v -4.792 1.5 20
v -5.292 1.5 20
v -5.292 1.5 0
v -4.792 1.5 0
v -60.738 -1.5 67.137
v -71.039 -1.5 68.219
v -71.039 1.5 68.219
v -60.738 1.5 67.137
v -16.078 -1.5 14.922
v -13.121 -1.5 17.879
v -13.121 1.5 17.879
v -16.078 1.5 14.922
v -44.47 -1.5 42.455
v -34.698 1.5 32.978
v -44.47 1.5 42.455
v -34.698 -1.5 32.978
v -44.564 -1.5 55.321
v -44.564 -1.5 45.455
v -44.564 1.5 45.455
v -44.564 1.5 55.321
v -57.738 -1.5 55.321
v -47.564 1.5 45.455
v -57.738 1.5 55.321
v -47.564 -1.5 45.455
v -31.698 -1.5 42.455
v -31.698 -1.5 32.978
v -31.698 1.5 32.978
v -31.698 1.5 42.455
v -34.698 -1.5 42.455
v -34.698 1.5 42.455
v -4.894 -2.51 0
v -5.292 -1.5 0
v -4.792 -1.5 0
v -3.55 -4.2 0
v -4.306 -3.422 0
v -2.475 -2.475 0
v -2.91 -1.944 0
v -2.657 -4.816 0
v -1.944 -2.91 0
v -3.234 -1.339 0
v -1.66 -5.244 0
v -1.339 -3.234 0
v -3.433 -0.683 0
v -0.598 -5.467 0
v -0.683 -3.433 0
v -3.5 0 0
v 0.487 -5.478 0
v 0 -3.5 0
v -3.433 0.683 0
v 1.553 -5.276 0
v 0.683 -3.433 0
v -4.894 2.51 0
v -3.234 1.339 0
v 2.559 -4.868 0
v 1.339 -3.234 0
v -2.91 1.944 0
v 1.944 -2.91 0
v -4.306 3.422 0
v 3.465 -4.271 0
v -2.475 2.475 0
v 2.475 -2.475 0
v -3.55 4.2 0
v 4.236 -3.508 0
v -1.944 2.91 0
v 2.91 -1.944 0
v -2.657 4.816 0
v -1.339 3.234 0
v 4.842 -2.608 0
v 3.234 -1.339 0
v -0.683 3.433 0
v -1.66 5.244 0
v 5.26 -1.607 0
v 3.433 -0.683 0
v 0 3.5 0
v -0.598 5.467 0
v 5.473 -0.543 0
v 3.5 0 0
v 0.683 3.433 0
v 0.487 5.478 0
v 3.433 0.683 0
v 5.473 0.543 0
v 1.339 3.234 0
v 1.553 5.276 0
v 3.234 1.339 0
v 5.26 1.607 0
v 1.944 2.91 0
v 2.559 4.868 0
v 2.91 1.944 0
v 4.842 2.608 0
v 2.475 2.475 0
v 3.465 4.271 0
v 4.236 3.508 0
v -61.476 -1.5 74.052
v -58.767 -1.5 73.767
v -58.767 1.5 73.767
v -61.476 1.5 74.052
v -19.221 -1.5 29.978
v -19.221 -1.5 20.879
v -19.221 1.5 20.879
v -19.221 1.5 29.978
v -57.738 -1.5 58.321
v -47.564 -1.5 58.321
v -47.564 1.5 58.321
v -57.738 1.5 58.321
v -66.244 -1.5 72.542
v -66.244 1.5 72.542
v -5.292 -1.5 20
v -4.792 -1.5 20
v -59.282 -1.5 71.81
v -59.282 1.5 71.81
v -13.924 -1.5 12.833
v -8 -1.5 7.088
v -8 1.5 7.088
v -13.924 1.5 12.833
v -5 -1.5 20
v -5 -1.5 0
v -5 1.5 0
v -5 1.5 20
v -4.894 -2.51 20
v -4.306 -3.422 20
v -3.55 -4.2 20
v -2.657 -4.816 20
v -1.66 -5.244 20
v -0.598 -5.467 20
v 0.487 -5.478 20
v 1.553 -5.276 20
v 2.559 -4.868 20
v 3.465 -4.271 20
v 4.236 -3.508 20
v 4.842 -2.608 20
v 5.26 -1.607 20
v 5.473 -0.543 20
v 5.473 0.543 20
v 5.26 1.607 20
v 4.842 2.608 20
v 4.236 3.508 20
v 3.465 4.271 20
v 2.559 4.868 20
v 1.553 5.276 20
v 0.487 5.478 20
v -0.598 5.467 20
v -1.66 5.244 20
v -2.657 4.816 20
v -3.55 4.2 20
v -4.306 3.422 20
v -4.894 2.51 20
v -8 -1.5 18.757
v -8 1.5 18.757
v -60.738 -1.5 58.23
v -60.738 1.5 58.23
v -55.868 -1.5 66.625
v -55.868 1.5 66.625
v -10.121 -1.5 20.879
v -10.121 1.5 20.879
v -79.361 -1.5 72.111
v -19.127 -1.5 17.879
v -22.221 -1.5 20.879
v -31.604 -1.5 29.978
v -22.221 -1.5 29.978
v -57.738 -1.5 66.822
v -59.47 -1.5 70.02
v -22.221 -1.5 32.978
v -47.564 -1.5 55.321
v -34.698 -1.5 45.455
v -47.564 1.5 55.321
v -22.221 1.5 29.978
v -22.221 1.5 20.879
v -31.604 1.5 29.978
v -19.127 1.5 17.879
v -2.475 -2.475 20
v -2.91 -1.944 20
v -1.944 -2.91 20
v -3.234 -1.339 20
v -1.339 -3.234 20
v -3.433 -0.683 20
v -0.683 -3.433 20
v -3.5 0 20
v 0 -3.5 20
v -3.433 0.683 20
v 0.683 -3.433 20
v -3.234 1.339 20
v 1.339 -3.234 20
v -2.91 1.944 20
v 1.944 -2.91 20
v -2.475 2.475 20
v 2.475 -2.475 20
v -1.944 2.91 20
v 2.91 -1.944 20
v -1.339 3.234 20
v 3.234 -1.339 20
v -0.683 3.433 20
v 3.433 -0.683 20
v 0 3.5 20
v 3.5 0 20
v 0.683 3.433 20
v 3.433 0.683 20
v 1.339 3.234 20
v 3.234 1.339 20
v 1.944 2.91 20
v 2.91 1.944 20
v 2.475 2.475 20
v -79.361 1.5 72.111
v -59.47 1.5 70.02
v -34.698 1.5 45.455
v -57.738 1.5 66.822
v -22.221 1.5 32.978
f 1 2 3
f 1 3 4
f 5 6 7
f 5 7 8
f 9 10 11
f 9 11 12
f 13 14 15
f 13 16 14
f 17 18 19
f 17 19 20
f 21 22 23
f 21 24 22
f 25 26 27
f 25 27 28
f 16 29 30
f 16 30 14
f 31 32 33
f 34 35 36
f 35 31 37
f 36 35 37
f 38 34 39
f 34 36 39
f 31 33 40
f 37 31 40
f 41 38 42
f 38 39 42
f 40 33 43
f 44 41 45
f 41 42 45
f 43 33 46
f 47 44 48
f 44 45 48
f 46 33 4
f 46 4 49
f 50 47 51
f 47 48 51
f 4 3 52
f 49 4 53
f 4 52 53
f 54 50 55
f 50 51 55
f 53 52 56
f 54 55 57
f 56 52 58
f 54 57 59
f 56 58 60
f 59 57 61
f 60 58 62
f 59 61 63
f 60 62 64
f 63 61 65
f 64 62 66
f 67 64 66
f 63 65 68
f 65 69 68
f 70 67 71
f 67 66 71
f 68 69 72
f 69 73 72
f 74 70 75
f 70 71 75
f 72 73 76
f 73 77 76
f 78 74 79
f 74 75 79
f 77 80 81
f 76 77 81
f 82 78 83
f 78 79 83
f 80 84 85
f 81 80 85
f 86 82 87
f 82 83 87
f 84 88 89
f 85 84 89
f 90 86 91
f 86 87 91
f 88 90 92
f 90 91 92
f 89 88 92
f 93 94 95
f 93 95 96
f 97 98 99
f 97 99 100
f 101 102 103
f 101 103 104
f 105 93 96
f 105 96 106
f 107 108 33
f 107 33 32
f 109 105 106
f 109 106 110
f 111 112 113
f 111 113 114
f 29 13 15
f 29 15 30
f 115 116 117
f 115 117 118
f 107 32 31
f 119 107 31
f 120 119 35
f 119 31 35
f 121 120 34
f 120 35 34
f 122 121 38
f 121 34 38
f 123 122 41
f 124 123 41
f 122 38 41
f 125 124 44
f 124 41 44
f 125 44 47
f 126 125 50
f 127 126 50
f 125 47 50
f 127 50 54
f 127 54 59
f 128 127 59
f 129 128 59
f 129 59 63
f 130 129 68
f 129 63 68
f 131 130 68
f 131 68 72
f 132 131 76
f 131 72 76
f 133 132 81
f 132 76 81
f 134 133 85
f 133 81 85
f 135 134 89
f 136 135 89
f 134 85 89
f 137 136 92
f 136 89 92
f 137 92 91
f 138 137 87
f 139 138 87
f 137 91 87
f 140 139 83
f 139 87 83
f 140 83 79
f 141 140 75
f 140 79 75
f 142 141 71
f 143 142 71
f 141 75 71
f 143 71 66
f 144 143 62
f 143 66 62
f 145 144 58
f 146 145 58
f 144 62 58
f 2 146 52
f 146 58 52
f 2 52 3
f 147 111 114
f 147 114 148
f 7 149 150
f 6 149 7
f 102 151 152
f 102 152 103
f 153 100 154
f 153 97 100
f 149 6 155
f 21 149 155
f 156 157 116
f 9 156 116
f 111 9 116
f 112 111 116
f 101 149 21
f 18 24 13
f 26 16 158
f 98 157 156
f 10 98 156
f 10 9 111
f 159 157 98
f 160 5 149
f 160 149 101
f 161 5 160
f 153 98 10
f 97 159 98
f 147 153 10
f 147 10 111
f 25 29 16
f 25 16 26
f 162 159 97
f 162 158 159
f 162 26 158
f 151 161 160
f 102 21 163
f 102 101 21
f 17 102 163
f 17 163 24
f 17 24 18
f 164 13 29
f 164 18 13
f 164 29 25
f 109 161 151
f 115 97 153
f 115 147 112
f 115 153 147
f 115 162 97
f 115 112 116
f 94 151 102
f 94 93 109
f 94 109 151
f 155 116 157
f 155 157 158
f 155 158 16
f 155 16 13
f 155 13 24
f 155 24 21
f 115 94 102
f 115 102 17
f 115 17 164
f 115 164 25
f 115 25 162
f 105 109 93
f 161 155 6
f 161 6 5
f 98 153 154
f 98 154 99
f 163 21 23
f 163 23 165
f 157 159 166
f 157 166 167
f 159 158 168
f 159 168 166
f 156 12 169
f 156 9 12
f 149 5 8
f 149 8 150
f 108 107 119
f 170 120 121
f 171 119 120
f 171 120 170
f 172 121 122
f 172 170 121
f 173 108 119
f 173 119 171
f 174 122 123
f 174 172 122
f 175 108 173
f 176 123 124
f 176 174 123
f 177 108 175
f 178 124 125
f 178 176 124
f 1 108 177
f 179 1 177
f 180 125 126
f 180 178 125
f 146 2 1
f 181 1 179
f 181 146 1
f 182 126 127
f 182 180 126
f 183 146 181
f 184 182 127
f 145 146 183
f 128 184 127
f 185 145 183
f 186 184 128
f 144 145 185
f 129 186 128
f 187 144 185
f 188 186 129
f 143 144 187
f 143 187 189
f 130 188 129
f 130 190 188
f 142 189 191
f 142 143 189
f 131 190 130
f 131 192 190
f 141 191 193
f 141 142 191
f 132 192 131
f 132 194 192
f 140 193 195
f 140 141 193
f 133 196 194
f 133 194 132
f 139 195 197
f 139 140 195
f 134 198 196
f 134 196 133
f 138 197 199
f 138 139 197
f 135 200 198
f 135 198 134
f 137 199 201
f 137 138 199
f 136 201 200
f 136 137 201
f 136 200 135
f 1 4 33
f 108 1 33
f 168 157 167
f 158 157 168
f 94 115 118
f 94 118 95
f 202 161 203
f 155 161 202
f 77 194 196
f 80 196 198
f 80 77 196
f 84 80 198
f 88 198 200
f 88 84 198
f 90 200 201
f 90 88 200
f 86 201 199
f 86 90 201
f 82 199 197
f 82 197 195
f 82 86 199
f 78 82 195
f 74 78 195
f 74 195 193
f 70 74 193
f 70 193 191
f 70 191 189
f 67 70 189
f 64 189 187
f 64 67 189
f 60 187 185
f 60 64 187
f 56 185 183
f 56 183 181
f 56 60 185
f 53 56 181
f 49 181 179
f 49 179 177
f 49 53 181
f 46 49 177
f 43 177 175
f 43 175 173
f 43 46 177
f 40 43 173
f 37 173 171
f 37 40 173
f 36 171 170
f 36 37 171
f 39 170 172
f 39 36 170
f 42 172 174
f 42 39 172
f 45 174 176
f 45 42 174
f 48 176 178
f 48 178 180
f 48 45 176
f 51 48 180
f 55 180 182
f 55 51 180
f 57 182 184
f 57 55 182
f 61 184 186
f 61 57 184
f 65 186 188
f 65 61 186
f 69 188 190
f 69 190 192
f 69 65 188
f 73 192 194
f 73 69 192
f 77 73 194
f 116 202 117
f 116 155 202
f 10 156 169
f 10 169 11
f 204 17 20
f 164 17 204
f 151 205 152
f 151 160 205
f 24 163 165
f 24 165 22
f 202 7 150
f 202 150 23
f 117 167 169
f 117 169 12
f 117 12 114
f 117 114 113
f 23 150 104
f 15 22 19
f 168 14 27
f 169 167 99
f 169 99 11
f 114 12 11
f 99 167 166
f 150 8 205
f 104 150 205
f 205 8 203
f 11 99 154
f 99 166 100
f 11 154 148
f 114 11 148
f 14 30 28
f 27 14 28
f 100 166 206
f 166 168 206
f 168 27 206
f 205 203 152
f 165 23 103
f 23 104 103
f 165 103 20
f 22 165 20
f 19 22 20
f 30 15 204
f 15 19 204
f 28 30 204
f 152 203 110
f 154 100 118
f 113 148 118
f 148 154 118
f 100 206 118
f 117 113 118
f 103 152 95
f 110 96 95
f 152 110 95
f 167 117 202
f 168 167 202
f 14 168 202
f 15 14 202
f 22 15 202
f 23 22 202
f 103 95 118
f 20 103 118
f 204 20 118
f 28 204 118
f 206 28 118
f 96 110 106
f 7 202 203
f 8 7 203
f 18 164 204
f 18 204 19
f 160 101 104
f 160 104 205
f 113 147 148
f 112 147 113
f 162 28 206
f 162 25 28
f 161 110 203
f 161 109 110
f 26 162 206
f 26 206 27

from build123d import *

# Parameters (mm, degrees)
F0_R     = 3.5
F1_DEPTH = 20
F3_DEPTH = 1.5


# Not quite as in the source:
# - a feature names something its author has since deleted; it is built from what else it names


with BuildPart() as f1:
    # F0 (on Top) → F1 (new body)
    with BuildSketch(Plane.XY):
        with BuildLine():
            Line((-4.7915026221, -1.5), (-5.2915026221, -1.5))
            ThreePointArc((-5.2915026221, -1.5), (5.5, 0), (-5.2915026221, 1.5))
            Line((-5.2915026221, 1.5), (-4.7915026221, 1.5))
            Line((-4.7915026221, 1.5), (-4.7915026221, -1.5))
        make_face()
        Circle(F0_R, mode=Mode.SUBTRACT)
    extrude(amount=F1_DEPTH)


with BuildPart() as f3:
    # F2 (on Front) → F3 (new body, symmetric)
    with BuildSketch(Plane.XZ):
        Polygon((-79.3605220673, 72.1106862647), (-5, 0), (-5, 20), (-54.4974746831, 69.4974746831), (-59.4700841599, 70.0201169994), align=None)
        Polygon((-57.7379381947, 66.8215362837), (-55.8675960947, 66.6249554076), (-47.5639026581, 58.321261971), (-44.5639026581, 55.321261971), (-34.6976905307, 45.4550498436), (-31.6976905307, 42.4550498436), (-22.2207557225, 32.9781150354), (-19.2207557225, 29.9781150354), (-10.1213203436, 20.8786796564), (-8, 18.7573593129), (-8, 7.0881840299), (-13.9242084231, 12.8331508898), (-16.0781127981, 14.9218872019), (-19.1271564551, 17.8786796564), (-22.2207557225, 20.8786796564), (-31.6040912633, 29.9781150354), (-34.6976905307, 32.9781150354), (-44.4703033907, 42.4550498436), (-47.5639026581, 45.4550498436), (-57.7379381947, 55.321261971), (-60.7379381947, 58.2304946227), (-71.0385888152, 68.2194909957), (-60.7379381947, 67.1368489895), align=None, mode=Mode.SUBTRACT)
        Polygon((-44.5639026581, 55.321261971), (-47.5639026581, 58.321261971), (-57.7379381947, 58.321261971), (-57.7379381947, 66.8215362837), (-60.7379381947, 67.1368489895), (-60.7379381947, 58.2304946227), (-57.7379381947, 55.321261971), (-47.5639026581, 55.321261971), (-47.5639026581, 45.4550498436), (-44.4703033907, 42.4550498436), (-34.6976905307, 42.4550498436), (-34.6976905307, 32.9781150354), (-31.6040912633, 29.9781150354), (-22.2207557225, 29.9781150354), (-22.2207557225, 20.8786796564), (-19.1271564551, 17.8786796564), (-13.1213203436, 17.8786796564), (-16.0781127981, 14.9218872019), (-13.9242084231, 12.8331508898), (-8, 18.7573593129), (-10.1213203436, 20.8786796564), (-19.2207557225, 20.8786796564), (-19.2207557225, 29.9781150354), (-22.2207557225, 32.9781150354), (-31.6976905307, 32.9781150354), (-31.6976905307, 42.4550498436), (-34.6976905307, 45.4550498436), (-44.5639026581, 45.4550498436), align=None)
        Polygon((-59.281932926, 71.8102564111), (-59.4700841599, 70.0201169994), (-54.4974746831, 69.4974746831), (-58.7671691133, 73.7671691133), (-61.4764084229, 74.0519216391), (-66.2435861936, 72.5419556539), align=None)
    extrude(amount=F3_DEPTH, both=True)


solid = Compound([f1.part, f3.part])
